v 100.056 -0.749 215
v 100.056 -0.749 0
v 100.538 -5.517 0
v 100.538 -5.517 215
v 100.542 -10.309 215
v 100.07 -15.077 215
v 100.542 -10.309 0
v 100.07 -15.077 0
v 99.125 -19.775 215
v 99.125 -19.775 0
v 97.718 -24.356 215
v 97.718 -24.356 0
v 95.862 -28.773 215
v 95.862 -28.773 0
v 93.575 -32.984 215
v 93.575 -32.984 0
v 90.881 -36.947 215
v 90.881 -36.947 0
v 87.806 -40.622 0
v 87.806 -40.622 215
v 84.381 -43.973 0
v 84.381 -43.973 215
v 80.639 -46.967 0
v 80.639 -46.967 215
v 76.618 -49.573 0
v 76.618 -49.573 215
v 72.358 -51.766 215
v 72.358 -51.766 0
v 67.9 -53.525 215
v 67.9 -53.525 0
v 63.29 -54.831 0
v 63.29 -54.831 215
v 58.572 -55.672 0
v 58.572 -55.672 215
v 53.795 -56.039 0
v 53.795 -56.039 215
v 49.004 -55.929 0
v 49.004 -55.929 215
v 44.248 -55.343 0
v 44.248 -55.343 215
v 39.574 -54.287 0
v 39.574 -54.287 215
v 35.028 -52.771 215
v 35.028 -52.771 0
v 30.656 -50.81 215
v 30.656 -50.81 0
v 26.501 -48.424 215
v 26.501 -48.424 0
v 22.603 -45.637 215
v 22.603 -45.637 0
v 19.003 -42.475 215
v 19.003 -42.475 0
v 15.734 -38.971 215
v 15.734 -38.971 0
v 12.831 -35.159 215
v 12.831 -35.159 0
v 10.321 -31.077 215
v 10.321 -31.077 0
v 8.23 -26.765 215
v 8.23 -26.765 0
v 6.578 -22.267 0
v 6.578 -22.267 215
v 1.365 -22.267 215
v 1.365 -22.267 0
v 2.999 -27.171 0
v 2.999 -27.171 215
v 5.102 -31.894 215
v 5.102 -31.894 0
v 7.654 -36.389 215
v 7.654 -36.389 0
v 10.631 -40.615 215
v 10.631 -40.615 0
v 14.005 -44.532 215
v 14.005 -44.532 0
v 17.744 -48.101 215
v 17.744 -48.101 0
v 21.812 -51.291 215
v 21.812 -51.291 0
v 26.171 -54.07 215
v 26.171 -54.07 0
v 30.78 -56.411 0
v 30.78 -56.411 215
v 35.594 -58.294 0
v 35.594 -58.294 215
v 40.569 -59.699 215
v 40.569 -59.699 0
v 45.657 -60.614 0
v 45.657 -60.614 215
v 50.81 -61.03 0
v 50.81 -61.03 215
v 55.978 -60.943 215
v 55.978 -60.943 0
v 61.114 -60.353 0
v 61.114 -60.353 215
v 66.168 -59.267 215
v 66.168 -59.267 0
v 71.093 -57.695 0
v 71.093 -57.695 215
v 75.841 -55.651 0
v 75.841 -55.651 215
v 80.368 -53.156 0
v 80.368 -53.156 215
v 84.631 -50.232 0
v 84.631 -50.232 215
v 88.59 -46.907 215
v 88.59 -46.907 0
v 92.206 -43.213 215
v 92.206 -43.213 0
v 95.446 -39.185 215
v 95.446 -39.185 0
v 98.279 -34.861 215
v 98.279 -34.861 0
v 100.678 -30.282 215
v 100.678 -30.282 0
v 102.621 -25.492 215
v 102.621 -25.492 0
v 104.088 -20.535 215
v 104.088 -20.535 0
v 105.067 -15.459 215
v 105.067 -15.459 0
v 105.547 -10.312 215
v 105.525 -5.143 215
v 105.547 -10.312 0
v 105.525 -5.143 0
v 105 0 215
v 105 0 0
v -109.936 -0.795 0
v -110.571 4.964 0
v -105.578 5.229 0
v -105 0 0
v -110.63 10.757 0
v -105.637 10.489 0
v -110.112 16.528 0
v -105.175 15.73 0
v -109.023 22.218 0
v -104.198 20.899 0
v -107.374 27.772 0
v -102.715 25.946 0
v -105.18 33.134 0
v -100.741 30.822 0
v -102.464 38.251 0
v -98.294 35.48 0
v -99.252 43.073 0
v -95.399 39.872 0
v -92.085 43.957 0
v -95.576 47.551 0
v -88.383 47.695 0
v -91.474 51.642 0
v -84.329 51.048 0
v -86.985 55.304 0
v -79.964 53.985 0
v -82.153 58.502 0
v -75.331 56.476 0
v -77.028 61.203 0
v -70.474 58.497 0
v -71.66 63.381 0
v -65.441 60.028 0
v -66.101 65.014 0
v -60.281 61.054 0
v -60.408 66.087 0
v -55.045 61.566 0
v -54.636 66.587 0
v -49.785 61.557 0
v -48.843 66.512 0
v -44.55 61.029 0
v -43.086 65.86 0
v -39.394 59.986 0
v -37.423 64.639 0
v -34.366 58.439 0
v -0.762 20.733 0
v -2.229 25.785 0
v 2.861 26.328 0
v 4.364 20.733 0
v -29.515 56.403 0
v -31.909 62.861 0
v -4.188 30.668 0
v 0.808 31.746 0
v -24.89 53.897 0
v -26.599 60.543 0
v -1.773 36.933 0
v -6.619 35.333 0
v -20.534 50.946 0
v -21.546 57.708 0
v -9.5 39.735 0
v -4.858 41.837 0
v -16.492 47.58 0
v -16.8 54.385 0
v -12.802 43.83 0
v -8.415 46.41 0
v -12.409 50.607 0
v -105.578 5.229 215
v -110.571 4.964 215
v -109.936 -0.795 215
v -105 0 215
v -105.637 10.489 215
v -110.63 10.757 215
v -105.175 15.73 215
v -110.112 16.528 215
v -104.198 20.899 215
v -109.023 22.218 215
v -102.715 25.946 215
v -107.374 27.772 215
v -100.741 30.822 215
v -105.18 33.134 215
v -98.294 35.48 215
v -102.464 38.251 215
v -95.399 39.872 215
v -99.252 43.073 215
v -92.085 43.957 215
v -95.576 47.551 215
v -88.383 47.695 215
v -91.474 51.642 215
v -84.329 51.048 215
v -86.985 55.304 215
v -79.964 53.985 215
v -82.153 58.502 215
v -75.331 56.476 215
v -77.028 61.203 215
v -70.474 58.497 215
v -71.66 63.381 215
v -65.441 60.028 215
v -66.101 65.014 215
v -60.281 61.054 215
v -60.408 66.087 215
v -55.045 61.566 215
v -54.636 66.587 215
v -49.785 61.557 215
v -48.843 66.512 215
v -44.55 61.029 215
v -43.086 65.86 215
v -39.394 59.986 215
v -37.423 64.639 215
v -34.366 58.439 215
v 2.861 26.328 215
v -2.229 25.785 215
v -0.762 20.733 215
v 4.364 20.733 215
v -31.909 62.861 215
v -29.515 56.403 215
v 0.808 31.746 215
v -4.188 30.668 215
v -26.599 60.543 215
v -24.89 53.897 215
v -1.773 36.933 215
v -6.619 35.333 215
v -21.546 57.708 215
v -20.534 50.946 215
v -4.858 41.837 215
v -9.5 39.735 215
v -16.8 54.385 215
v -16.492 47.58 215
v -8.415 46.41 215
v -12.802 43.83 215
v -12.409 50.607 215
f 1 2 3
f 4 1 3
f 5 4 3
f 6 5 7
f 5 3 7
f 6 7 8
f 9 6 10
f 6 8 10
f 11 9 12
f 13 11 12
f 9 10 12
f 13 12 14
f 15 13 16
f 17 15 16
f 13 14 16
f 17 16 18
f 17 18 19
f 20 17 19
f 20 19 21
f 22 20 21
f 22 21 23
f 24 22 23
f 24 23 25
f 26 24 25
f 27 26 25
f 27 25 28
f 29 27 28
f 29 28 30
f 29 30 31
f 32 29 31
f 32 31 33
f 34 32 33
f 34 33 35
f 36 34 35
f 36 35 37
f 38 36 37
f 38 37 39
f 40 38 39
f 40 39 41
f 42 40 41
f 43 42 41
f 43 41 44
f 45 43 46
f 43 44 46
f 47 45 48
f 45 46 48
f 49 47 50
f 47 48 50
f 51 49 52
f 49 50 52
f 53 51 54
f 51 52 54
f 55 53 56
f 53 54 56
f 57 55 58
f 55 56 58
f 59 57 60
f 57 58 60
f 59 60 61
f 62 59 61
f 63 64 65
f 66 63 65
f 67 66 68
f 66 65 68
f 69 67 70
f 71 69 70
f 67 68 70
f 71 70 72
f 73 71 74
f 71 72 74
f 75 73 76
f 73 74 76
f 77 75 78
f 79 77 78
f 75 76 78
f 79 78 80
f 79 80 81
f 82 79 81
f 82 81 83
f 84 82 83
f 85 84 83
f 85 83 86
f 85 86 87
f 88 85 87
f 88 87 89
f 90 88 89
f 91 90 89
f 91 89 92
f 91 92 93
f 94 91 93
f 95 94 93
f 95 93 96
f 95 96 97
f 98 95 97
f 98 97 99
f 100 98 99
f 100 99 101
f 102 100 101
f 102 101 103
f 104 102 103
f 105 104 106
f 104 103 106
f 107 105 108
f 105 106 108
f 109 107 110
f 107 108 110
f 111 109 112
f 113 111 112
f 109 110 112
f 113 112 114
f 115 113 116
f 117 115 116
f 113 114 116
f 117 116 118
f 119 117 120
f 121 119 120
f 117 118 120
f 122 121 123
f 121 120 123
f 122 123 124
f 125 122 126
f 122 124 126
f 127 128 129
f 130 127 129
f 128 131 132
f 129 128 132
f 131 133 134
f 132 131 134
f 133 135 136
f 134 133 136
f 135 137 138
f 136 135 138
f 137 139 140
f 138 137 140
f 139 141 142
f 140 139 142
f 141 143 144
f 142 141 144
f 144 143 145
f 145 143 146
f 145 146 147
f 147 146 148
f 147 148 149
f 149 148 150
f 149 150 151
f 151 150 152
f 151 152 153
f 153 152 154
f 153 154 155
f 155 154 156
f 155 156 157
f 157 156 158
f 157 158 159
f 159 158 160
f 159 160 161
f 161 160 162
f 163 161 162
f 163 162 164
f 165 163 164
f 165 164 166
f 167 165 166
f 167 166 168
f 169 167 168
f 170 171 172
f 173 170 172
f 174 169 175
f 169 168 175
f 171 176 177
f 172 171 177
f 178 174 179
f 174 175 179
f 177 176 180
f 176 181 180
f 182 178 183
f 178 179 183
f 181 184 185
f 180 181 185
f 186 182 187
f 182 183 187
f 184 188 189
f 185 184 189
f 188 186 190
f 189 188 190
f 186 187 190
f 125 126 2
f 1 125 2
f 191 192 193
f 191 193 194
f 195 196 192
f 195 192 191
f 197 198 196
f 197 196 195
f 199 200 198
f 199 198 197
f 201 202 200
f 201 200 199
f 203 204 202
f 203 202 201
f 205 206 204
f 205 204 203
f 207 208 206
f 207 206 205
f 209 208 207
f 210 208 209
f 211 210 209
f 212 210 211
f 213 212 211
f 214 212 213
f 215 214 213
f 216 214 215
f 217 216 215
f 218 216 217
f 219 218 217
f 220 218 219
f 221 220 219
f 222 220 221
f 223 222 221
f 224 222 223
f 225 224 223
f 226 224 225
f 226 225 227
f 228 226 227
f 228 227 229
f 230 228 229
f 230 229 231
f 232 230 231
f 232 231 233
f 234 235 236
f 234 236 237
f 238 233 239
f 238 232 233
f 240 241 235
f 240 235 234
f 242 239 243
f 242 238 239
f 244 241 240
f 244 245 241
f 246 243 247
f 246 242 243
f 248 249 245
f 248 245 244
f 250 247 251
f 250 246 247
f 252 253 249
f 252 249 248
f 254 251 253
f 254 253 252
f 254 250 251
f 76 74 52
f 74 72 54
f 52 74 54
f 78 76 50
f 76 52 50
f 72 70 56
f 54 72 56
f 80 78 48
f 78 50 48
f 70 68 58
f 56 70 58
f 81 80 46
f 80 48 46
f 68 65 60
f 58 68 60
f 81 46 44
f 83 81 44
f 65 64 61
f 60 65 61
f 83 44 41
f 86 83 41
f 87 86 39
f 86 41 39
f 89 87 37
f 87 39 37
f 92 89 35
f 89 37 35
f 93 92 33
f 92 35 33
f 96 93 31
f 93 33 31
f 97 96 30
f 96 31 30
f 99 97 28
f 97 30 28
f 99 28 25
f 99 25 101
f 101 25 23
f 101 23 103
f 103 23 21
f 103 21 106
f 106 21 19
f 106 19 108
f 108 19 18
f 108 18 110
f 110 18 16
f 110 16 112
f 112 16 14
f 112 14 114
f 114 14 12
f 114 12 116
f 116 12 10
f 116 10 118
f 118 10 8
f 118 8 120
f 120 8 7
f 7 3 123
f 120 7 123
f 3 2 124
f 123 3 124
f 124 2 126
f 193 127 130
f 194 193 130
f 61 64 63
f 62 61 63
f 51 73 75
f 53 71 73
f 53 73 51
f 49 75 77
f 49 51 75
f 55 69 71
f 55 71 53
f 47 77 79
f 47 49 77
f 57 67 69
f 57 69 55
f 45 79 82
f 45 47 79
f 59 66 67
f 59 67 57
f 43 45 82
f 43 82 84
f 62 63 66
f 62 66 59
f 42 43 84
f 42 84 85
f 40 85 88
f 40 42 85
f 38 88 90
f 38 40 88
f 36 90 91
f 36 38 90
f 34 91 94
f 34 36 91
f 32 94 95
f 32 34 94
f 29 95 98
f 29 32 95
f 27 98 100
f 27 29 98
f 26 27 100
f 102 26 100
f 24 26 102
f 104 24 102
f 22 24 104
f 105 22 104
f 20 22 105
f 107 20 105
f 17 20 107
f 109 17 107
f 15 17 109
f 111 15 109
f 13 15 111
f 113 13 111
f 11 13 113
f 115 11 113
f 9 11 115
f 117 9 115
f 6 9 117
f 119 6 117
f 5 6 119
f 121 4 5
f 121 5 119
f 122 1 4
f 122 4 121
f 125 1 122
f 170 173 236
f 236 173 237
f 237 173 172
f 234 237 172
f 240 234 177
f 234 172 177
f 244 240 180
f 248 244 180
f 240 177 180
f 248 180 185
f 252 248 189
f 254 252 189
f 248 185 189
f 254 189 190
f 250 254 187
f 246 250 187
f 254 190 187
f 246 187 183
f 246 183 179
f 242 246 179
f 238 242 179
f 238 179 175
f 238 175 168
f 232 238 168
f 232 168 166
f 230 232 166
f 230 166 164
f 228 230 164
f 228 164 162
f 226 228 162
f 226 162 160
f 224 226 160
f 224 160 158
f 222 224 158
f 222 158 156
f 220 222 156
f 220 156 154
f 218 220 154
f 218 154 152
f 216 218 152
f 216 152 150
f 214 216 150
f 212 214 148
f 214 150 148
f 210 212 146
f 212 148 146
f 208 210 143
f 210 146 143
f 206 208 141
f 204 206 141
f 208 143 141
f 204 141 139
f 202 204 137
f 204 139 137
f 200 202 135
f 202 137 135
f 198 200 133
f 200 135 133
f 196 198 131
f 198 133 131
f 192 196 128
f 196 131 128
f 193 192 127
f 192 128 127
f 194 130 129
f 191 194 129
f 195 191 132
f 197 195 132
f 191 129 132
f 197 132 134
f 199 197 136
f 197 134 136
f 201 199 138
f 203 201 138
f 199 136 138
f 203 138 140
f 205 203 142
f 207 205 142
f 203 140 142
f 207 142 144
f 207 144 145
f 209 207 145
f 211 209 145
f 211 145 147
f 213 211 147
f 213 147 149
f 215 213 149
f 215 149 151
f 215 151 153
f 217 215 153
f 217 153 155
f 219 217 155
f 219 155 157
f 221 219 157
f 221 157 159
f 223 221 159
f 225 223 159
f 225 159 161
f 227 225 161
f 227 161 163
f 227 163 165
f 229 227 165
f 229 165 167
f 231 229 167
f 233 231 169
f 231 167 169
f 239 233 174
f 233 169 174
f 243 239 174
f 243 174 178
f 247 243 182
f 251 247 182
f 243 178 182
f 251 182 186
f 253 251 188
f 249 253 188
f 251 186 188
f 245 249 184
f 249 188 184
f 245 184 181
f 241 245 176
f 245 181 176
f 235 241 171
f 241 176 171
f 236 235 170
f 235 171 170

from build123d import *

# Parameters (mm, degrees)
F1_DEPTH      = 215
F2_W          = 43
F2_H          = 215
F3_DEPTH      = 7
F3_DEPTH_BACK = 7


with BuildPart() as f1:
    # F0 (on Top) → F1 (new body)
    with BuildSketch(Plane.XY):
        with BuildLine():
            ThreePointArc((-105, 0), (-52.5, 61.626583), (0, 0))
            ThreePointArc((0, 0), (52.5, -61.056566), (105, 0))
            Line((105, 0), (100.056457, -0.749253))
            ThreePointArc((100.056457, -0.749253), (52.510935, -56.056565), (4.940271, -0.770877))
            ThreePointArc((4.940271, -0.770877), (-52.512018, 66.626581), (-109.936456, -0.794608))
            Line((-109.936456, -0.794608), (-105, 0))
        make_face()
    extrude(amount=F1_DEPTH)

    # F2 (on Right) → F3 (cut, two sides)
    with BuildSketch(Plane.YZ) as f3_sk:
        with Locations((-0.766836, 107.5)):
            Rectangle(F2_W, F2_H)
    extrude(amount=F3_DEPTH, mode=Mode.SUBTRACT)
    extrude(f3_sk.sketch, amount=-F3_DEPTH_BACK, mode=Mode.SUBTRACT)


solid = f1.part
